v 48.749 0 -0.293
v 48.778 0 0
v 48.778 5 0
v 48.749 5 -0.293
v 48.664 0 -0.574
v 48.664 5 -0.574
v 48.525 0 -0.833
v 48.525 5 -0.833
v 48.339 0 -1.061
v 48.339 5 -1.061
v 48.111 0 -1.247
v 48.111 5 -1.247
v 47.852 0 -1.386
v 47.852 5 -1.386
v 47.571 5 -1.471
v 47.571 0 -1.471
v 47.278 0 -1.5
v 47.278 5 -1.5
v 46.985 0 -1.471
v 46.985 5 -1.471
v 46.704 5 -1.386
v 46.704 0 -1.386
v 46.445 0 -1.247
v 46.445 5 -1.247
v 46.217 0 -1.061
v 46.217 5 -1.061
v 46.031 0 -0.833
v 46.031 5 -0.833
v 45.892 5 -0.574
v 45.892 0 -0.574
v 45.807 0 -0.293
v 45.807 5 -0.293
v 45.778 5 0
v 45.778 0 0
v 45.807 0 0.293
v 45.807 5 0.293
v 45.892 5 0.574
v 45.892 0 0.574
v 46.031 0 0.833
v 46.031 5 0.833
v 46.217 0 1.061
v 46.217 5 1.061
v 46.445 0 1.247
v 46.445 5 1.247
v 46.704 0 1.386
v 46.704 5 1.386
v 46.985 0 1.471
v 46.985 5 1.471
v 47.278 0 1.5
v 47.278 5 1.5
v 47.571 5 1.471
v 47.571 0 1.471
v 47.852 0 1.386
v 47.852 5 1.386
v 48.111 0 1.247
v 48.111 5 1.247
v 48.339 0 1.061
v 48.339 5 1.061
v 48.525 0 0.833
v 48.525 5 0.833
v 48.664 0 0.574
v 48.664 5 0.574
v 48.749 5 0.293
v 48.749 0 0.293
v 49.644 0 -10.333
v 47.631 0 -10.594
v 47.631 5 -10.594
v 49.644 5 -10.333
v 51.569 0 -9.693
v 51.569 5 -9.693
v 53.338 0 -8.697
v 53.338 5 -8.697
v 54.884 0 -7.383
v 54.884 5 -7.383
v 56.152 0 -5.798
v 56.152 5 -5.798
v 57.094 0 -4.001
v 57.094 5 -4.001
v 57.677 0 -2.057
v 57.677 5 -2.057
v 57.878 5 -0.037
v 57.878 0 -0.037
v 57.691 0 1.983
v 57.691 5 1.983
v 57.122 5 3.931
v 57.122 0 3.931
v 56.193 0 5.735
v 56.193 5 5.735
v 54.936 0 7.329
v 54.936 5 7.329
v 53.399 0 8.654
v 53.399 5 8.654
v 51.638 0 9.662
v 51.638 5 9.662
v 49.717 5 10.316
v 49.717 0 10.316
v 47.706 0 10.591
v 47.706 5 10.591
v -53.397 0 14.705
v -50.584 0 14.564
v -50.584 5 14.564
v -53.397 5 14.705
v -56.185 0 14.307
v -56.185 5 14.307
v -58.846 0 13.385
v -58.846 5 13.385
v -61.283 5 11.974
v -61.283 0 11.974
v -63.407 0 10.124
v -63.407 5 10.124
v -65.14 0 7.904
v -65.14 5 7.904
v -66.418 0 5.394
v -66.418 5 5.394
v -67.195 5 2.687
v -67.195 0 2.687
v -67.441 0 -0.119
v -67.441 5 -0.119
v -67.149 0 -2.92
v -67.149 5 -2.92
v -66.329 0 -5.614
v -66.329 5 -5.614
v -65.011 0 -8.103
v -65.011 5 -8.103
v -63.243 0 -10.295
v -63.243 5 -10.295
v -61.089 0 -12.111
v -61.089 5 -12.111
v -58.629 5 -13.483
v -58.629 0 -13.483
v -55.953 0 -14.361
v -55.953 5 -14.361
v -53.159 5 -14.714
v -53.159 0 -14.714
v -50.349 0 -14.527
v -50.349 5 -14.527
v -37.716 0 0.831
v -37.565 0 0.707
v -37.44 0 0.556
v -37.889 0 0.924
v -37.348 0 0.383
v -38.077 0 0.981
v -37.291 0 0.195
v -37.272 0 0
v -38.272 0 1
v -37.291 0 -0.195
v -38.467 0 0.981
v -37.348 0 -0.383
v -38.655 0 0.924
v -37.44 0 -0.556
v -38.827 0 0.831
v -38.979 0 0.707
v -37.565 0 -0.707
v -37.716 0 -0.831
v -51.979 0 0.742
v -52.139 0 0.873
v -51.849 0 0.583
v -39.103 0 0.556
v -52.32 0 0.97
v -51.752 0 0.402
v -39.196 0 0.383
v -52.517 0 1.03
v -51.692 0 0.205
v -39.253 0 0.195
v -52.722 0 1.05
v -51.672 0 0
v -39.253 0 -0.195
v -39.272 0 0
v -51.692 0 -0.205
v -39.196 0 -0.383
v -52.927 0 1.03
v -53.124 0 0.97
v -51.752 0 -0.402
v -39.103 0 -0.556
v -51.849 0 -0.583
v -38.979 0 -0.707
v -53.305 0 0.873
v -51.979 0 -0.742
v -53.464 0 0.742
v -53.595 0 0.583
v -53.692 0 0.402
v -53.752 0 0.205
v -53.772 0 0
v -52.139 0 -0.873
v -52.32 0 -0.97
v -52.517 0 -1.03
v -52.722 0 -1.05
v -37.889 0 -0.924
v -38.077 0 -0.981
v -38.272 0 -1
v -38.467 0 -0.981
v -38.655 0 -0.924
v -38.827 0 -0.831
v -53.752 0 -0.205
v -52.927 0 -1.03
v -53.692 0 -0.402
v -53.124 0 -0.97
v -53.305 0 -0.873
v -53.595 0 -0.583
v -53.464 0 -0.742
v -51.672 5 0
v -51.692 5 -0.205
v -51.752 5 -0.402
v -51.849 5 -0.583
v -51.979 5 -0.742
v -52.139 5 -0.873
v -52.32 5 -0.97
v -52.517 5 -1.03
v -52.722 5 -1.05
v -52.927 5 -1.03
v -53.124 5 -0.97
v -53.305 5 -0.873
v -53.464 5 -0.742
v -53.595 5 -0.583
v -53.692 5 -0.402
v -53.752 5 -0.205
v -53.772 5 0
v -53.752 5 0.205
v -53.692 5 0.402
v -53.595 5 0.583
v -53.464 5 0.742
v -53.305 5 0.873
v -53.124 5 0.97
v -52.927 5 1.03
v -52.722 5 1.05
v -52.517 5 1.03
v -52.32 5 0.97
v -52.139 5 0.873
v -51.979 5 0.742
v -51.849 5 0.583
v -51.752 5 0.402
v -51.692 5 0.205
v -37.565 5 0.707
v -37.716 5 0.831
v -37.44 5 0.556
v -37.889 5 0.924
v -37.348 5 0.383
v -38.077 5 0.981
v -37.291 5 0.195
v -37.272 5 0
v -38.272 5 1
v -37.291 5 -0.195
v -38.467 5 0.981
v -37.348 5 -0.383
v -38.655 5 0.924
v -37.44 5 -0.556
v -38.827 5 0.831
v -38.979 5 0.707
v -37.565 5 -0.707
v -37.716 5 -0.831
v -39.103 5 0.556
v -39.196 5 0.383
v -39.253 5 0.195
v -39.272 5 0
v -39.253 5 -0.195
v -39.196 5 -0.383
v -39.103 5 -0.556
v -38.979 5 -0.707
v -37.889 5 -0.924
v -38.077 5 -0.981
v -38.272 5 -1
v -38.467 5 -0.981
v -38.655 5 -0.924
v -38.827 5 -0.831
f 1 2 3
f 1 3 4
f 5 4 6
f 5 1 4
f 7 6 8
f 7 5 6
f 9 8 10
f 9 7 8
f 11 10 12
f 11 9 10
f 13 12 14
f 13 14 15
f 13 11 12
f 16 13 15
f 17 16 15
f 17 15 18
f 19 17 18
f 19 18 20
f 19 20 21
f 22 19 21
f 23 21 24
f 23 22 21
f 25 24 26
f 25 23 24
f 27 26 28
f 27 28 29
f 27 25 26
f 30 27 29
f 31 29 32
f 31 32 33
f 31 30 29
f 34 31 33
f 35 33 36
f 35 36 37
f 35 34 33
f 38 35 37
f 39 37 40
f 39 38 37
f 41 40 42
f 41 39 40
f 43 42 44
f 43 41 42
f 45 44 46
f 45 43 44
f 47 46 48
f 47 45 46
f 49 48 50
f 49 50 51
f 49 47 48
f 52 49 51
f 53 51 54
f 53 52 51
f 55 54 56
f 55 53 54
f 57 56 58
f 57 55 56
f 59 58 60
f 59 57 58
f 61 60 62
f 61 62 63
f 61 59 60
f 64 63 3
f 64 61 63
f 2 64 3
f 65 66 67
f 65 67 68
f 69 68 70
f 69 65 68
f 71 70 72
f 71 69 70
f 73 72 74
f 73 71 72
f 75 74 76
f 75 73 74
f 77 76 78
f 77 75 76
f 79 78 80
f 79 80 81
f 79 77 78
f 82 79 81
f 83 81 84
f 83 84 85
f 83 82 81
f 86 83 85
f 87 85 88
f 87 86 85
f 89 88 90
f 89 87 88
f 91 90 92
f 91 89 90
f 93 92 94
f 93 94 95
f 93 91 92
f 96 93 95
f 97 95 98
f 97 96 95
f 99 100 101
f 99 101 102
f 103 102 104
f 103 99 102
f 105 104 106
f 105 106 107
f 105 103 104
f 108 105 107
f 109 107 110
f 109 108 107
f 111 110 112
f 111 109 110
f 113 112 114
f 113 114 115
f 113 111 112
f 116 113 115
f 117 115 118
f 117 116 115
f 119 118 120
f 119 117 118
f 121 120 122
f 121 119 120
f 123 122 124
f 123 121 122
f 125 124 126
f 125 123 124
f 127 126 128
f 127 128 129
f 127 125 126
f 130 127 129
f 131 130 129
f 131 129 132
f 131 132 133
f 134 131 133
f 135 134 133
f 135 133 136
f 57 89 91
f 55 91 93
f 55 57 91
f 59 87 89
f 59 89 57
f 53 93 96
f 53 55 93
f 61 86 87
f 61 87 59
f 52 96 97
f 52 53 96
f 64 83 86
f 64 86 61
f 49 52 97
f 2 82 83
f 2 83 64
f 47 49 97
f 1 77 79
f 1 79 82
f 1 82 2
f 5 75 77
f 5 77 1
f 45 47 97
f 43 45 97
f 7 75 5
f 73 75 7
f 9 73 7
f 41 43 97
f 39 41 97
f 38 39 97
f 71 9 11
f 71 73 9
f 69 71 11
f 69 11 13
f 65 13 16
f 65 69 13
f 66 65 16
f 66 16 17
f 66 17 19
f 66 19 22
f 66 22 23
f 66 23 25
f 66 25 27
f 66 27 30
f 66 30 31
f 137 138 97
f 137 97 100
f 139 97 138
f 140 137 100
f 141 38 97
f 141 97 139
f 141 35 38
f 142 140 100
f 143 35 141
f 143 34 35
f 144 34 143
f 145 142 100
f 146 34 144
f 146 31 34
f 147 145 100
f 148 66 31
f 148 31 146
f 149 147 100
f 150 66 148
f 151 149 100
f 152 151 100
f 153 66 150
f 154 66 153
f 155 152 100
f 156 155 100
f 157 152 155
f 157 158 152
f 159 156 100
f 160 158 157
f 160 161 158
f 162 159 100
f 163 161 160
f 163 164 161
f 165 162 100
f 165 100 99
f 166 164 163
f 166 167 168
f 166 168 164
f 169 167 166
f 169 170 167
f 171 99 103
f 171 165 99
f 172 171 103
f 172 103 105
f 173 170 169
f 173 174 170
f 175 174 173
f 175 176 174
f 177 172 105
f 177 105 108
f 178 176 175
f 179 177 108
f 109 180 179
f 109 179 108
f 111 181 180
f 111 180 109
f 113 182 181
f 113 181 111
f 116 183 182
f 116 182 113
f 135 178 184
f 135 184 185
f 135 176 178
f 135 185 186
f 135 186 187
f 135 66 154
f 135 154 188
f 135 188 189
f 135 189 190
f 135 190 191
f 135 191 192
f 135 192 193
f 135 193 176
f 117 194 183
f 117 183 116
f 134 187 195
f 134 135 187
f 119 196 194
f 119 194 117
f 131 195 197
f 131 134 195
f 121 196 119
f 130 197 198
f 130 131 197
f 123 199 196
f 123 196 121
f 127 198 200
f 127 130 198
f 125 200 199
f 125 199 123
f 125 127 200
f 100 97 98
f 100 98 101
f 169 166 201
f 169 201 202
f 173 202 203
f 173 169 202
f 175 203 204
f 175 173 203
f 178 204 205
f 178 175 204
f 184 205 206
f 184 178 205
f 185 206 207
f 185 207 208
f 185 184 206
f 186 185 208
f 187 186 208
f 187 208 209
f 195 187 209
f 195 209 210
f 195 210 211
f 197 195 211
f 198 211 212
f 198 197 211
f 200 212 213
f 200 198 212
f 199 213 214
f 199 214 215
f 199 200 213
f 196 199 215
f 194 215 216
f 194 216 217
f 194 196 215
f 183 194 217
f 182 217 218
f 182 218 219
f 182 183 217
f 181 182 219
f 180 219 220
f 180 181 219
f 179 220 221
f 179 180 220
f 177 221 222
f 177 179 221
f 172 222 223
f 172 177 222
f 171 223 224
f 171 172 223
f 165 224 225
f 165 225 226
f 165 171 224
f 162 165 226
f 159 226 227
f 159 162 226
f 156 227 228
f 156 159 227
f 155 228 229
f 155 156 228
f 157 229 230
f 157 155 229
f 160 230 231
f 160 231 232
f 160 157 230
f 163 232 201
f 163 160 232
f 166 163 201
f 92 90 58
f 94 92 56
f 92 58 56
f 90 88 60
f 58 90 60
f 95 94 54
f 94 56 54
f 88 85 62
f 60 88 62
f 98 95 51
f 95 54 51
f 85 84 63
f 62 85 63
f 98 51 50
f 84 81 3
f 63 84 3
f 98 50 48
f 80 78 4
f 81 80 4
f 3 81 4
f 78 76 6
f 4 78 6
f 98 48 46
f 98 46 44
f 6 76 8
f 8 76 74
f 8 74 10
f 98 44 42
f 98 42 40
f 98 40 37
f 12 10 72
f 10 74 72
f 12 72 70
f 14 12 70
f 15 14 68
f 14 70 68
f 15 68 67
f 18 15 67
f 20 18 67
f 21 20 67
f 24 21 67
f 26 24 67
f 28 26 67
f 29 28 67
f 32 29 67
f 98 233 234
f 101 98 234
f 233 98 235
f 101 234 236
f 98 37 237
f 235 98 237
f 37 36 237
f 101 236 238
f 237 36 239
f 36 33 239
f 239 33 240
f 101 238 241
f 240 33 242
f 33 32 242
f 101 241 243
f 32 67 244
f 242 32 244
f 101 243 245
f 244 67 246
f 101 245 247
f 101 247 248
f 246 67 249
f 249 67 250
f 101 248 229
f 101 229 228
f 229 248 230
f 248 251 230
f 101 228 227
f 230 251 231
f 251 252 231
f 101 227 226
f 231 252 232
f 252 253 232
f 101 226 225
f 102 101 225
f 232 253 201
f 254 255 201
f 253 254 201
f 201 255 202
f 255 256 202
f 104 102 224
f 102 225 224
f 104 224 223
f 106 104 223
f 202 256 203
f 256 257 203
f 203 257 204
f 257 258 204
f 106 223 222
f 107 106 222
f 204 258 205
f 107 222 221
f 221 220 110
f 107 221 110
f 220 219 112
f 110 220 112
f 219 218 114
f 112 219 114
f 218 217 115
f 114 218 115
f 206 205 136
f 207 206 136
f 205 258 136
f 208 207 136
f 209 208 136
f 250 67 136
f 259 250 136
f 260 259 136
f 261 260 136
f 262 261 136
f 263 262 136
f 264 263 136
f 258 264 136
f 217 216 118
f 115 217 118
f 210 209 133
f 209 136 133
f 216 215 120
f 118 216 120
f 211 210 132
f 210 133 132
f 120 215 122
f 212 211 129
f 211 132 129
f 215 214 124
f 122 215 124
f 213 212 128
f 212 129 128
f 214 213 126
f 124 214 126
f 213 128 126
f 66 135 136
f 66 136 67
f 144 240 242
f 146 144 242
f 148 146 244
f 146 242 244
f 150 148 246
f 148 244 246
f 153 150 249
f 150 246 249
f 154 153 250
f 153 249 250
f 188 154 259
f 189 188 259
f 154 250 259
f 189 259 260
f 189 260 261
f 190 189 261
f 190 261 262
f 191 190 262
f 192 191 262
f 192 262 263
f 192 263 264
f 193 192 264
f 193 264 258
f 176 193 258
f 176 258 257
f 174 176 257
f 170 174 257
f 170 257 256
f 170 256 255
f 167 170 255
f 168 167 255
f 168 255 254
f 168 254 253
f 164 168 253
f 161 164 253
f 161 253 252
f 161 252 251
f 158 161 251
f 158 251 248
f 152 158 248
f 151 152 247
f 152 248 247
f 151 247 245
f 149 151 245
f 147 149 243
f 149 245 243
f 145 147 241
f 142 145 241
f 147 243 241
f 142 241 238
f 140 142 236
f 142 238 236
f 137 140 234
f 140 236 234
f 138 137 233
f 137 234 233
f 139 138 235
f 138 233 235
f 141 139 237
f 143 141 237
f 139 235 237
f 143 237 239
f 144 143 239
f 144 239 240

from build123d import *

# Parameters (mm, degrees)
SKETCH1_R               = 1.05
SKETCH1_R_2             = 1.5
BOSS_EXTRUDE1_DEPTH     = 5
SKETCH2_R               = 1
CUT_EXTRUDE1_DEPTH      = 1
CUT_EXTRUDE1_DEPTH_BACK = 6


with BuildPart() as part:
    # Sketch1 → Boss-Extrude1 (new body)
    with BuildSketch(Plane(origin=(0, 0, 0), x_dir=(1, 0, 0), z_dir=(0, 1, 0))):
        with BuildLine():
            Line((-50.348842759, 14.527458054), (47.631245247, 10.594116014))
            ThreePointArc((47.631245247, 10.594116014), (57.878041754, 0.037488485), (47.706171294, -10.591353165))
            Line((47.706171294, -10.591353165), (-50.583585242, -14.563860903))
            ThreePointArc((-50.583585242, -14.563860903), (-67.441412758, 0.118774156), (-50.348842759, 14.527458054))
        make_face()
        with Locations((-52.721891954, 0)):
            Circle(SKETCH1_R, mode=Mode.SUBTRACT)
        with Locations((47.278108046, 0)):
            Circle(SKETCH1_R_2, mode=Mode.SUBTRACT)
    extrude(amount=BOSS_EXTRUDE1_DEPTH)

    # Sketch2 → Cut-Extrude1 (cut, two sides)
    with BuildSketch(Plane(origin=(0, 5, 0), x_dir=(1, 0, 0), z_dir=(0, 1, 0))) as cut_extrude1_sk:
        with Locations((-38.271891954, 0)):
            Circle(SKETCH2_R)
    extrude(amount=CUT_EXTRUDE1_DEPTH, mode=Mode.SUBTRACT)
    extrude(cut_extrude1_sk.sketch, amount=-CUT_EXTRUDE1_DEPTH_BACK, mode=Mode.SUBTRACT)


solid = part.part
